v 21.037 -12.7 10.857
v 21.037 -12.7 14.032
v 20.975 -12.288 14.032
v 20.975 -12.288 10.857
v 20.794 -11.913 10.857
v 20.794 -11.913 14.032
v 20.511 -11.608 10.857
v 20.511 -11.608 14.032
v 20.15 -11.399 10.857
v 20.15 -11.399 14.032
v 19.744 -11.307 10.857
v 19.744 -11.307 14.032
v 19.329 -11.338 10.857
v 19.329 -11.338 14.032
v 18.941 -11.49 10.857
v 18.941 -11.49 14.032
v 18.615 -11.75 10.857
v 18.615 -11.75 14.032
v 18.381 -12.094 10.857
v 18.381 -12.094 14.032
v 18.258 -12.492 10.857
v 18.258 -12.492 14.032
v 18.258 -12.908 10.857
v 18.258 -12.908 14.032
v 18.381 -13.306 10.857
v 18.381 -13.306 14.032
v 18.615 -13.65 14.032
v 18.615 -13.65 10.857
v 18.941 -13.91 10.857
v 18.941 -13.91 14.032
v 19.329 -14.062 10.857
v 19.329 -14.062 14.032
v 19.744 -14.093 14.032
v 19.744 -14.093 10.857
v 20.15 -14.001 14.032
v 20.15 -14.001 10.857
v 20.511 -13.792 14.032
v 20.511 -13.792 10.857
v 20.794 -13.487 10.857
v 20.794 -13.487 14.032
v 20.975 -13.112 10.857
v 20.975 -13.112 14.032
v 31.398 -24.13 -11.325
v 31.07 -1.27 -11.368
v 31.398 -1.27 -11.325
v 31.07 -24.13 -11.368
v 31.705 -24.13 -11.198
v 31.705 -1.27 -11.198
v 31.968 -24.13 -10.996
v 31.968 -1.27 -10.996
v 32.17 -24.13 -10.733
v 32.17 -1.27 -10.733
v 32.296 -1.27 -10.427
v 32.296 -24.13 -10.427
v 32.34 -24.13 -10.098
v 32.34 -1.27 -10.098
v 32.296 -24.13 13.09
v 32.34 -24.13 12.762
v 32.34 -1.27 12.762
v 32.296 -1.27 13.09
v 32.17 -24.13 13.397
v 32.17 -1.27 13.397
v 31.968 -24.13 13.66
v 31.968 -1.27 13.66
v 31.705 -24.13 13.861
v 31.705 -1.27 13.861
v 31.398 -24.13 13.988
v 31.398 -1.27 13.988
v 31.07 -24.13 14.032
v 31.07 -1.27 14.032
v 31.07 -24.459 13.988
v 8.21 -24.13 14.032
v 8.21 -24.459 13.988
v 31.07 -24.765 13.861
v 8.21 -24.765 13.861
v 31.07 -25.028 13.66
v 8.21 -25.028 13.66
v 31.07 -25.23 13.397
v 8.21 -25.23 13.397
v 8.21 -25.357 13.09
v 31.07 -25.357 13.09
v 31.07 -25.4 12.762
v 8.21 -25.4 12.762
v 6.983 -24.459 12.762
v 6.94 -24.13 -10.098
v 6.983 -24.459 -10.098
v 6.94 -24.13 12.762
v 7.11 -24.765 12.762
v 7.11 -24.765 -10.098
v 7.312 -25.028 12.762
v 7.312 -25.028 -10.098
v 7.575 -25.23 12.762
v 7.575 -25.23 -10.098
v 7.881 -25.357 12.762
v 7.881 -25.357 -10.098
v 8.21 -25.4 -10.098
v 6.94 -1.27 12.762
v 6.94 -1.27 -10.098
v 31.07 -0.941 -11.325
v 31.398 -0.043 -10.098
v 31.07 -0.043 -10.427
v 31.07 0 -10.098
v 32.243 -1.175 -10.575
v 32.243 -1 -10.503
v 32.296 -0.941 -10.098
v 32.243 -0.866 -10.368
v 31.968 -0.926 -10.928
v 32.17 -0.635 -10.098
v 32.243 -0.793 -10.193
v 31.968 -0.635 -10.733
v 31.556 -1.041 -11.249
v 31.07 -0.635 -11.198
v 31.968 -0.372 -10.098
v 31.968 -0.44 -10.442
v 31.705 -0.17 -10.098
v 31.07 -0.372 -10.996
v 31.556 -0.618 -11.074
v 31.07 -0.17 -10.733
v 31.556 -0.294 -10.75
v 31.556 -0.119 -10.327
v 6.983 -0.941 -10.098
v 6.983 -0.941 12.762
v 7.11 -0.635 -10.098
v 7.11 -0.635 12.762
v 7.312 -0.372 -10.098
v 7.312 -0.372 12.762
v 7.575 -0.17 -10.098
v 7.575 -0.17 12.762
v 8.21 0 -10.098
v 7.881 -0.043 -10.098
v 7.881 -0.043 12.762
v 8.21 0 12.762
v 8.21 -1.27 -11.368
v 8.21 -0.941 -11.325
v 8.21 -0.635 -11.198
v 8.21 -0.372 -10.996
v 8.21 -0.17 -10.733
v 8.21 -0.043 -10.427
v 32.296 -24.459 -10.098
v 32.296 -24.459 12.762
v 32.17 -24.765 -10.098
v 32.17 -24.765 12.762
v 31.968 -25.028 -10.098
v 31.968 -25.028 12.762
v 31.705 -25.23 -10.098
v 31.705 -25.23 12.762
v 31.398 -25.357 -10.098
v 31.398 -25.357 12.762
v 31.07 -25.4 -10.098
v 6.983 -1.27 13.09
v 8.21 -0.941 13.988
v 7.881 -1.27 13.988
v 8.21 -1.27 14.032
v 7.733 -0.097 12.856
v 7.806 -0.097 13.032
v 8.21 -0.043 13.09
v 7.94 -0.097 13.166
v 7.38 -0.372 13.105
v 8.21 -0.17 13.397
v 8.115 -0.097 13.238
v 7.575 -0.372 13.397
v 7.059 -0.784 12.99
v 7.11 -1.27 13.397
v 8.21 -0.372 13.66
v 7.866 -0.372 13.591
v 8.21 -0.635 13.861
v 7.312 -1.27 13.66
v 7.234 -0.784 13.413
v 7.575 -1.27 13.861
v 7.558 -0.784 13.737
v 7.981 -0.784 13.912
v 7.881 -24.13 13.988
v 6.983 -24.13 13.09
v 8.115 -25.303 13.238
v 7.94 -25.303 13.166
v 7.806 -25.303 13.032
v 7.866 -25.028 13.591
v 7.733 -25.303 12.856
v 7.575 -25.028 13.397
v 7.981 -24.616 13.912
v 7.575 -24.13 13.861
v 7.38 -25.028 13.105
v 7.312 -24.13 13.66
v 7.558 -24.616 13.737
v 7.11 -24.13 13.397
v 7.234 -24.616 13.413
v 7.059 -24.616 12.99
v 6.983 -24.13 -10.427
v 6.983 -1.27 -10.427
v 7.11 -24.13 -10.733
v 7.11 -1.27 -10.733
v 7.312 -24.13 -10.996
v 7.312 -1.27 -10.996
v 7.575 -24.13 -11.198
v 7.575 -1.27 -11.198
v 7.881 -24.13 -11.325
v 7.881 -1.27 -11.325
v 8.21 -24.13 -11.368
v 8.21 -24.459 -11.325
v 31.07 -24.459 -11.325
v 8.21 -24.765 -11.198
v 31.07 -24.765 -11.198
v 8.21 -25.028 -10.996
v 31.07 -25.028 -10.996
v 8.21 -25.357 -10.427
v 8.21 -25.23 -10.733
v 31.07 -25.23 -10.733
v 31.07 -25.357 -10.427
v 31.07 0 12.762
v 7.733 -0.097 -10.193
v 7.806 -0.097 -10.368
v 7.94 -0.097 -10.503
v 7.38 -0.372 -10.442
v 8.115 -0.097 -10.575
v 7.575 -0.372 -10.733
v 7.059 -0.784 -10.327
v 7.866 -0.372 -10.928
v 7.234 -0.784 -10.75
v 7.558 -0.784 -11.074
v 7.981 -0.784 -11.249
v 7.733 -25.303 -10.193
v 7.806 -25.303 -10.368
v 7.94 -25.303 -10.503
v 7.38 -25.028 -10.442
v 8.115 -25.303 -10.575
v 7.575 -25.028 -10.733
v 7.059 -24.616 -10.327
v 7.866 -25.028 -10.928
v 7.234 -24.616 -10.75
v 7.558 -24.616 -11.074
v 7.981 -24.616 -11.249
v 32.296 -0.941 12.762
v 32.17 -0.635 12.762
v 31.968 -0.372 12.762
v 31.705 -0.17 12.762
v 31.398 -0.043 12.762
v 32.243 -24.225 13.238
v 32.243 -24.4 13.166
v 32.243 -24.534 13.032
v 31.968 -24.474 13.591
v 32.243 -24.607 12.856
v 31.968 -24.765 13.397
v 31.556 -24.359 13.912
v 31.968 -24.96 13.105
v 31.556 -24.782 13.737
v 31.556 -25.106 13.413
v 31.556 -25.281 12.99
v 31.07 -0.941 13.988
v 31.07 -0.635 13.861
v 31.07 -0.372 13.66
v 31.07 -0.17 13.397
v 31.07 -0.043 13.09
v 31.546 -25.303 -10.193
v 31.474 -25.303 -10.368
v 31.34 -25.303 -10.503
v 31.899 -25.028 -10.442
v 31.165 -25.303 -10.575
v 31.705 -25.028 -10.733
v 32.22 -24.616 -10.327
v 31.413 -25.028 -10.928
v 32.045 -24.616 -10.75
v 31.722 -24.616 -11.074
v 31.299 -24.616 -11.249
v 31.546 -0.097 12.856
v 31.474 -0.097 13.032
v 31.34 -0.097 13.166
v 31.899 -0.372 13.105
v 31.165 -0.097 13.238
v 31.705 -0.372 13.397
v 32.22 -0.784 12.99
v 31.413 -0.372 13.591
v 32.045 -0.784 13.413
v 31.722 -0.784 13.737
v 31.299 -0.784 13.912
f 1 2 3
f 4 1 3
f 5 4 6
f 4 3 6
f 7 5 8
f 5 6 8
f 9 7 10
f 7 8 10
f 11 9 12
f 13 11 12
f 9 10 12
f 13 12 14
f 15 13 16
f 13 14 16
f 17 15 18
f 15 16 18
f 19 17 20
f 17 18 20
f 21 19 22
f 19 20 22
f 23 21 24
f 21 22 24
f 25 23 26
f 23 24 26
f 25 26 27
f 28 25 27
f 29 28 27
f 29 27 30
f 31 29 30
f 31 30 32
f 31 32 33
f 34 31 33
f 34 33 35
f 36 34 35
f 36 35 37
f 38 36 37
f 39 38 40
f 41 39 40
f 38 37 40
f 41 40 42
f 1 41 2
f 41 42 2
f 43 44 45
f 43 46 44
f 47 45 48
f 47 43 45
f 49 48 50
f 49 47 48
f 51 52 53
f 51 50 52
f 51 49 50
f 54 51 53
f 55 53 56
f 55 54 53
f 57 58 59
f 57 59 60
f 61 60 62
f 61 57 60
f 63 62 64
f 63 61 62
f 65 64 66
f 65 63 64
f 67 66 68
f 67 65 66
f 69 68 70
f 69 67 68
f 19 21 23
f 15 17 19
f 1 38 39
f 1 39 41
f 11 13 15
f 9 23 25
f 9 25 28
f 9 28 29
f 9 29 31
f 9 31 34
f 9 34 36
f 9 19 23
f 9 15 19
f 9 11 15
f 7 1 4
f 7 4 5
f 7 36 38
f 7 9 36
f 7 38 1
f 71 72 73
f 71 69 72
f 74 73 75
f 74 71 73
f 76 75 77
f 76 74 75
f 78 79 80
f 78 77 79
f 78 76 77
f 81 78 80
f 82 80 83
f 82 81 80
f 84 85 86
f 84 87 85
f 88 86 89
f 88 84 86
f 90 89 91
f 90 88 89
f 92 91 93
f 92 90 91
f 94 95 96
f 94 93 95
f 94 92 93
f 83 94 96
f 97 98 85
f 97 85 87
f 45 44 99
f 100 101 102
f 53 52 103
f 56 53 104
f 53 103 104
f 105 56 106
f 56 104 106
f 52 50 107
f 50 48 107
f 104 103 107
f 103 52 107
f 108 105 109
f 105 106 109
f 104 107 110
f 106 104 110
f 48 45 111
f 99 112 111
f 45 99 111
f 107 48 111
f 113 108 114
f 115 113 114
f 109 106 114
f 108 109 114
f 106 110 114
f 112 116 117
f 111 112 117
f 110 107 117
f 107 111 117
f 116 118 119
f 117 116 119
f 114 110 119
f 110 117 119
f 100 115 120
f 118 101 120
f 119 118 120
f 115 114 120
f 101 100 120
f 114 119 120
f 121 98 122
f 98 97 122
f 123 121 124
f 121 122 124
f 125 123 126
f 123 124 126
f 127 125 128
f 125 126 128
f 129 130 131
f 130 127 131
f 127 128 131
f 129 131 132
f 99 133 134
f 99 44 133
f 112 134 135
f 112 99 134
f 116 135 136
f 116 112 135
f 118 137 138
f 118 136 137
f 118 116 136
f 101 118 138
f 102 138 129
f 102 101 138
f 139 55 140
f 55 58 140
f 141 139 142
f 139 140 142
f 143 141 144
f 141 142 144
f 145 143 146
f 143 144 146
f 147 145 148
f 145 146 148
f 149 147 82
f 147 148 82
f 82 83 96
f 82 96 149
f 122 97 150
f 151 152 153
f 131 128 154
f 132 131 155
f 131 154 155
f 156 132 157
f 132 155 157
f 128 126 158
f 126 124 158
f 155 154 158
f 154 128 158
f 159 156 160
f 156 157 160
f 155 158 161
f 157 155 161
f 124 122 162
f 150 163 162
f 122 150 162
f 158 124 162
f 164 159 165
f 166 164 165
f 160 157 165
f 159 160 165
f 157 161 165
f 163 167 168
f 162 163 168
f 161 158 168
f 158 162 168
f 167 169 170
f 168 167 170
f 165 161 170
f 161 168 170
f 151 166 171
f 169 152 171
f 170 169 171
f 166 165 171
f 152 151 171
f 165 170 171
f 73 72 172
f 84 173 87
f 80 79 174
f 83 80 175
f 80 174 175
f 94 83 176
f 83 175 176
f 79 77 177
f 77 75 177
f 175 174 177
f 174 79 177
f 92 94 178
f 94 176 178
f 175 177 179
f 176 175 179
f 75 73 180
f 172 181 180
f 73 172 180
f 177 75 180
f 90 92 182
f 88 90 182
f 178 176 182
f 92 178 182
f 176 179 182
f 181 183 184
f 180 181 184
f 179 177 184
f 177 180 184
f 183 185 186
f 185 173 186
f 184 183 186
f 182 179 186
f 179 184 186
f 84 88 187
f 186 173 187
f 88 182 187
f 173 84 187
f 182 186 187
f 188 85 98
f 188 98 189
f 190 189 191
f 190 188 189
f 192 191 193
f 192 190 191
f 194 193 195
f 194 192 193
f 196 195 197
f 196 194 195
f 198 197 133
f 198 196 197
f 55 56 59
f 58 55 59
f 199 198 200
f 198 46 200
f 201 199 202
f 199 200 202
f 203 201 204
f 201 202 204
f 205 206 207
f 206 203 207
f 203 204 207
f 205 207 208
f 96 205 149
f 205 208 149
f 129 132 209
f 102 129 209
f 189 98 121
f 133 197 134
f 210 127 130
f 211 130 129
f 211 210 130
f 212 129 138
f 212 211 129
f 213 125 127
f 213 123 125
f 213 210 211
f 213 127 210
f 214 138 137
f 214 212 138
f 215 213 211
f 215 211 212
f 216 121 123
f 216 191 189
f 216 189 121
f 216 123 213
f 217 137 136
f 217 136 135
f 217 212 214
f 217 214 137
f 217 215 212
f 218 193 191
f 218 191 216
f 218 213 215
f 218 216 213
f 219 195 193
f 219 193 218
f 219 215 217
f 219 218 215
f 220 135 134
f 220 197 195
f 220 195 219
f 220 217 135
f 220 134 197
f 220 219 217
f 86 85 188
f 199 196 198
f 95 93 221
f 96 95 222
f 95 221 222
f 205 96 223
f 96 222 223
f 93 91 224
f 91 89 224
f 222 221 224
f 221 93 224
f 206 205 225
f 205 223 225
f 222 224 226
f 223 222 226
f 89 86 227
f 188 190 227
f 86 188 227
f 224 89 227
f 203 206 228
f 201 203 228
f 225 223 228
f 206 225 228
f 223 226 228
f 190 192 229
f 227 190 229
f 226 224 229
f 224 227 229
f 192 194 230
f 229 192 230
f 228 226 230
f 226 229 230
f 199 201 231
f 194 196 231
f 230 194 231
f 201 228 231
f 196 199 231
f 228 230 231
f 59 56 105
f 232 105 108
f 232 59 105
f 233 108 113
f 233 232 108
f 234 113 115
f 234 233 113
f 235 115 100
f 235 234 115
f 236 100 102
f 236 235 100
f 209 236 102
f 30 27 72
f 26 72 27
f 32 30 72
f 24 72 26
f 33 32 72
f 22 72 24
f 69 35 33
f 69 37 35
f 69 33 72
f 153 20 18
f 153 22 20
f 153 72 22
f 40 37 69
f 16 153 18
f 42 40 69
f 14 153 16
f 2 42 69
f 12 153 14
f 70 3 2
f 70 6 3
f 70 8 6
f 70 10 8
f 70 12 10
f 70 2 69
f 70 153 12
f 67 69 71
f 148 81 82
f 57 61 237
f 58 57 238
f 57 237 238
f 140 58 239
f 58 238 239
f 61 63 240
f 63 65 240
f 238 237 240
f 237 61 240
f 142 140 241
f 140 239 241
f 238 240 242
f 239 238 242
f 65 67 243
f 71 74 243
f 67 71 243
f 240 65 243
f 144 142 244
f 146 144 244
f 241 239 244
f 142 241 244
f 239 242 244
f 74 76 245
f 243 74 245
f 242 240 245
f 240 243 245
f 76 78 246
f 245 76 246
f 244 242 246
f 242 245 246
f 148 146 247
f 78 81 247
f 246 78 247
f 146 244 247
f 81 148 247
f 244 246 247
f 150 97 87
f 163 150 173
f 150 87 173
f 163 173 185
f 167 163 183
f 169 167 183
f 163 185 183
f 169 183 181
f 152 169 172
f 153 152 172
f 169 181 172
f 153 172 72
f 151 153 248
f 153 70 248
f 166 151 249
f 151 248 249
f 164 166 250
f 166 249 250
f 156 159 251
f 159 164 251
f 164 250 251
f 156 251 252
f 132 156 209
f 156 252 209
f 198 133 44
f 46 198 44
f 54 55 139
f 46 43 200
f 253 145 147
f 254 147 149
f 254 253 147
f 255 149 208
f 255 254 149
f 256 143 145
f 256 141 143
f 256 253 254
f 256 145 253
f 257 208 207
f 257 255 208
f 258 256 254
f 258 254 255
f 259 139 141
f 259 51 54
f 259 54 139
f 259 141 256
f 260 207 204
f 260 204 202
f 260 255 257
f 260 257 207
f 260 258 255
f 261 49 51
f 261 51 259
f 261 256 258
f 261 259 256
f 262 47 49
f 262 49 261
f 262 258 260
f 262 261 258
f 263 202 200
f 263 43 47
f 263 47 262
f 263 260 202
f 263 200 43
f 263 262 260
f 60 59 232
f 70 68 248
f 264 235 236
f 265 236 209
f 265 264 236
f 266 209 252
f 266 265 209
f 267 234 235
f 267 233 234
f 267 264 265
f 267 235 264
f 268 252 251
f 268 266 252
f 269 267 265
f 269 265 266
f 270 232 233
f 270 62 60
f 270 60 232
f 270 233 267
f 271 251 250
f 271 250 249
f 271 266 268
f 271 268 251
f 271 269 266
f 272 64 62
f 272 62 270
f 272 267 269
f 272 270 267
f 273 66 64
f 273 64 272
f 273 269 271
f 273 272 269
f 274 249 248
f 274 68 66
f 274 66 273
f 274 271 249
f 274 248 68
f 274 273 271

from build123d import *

# Parameters (mm, degrees)
F0_W     = 25.4
F0_H     = 25.4
F1_DEPTH = 25.4
F2_R     = 1.27
F3_R     = 1.397249
F4_DEPTH = 3.175


with BuildPart() as f1:
    # F0 (on Front) → F1 (new body)
    with BuildSketch(Plane.XZ):
        with Locations((19.639693, 1.331531)):
            Rectangle(F0_W, F0_H)
    extrude(amount=F1_DEPTH)

    # F2
    f2_edges = [f1.edges().sort_by_distance(p)[0] for p in [
        (6.939693, -12.7, 14.031531),
        (19.639693, -25.4, 14.031531),
        (6.939693, -12.7, -11.368469),
        (6.939693, 0, 1.331531),
        (6.939693, -25.4, 1.331531),
        (19.639693, 0, -11.368469),
        (32.339693, -12.7, -11.368469),
        (32.339693, -12.7, 14.031531),
        (32.339693, 0, 1.331531),
        (32.339693, -25.4, 1.331531),
        (19.639693, 0, 14.031531),
        (19.639693, -25.4, -11.368469),
    ]]
    fillet(f2_edges, radius=F2_R)

    # F3 (on face) → F4 (cut)
    with BuildSketch(Plane.XY.offset(14.031531)):
        with Locations((19.639693, -12.7)):
            Circle(F3_R)
    extrude(amount=-F4_DEPTH, mode=Mode.SUBTRACT)


solid = f1.part
